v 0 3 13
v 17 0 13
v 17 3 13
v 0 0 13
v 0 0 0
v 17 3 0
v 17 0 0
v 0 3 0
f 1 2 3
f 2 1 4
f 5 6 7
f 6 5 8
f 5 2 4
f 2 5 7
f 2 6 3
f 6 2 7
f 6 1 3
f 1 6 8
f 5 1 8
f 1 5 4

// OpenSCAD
// Generated by SolidPython 1.0.1 on 2020-07-29 00:46:56


cube(size = [17, 3, 13]);
/***********************************************
*********      SolidPython code:      **********
************************************************
 
# import packages: SolidPython
from solid import *
from solid.utils import *
from itertools import chain, combinations, permutations


class Resize:

    def __init__(self, scad_file):
        self.scad_file = scad_file
        #self.scad_file = import_scad(scad_file)
        # cone/cylinder param:
        self.r1 = 0
        self.r2 = 0
        self.h = 0
        # rectangular prism param:
        self.w = 0
        self.l = 0
        # ellipse param:
        self.r = 0

    # import OpenScad code (file name corresponds to shape)


    # classify shape + parameters
    def assign(self, param1, param2, param3):
        if self.scad_file == 'cone.scad':
            self.r1 = param1
            self.r2 = param2
            self.h = param3
        elif self.scad_file == 'cylinder.scad':
            self.r1 = param1
            self.r2 = param2
            self.h = param3
        elif self.scad_file == 'rectangularPrism.scad':
            self.h = param1
            self.l = param2
            self.w = param3
        else:
            self.r = param1
            self.h = param2

    # resize parameters
    def iterate(self):
        x = range(3, 20, 2)
        i = 1
        if self.scad_file == 'cone.scad':
            tempList = list(permutations(x, 2))
            for temp in tempList:
                param1 = temp[0]
                param2 = temp[1]
                filepath = 'produced_scad_files/' + 'cone' + str(param1) + '_' + str(param2) + '_' + '.scad'
                scad_render_to_file(cylinder(h=param1, r1=param2, r2=0), filepath)

        elif self.scad_file == 'cylinder.scad':
            tempList = list(permutations(x, 3))
            for temp in tempList:
                param1 = temp[0]
                param2 = temp[1]
                filepath = 'produced_scad_files/' + 'cylinder' + str(param1) + '_' + str(param2) + '_' + '.scad'
                scad_render_to_file(cylinder(h=param1, r1=param2, r2=param2), filepath)

        elif self.scad_file == 'rectangularPrism.scad':
            tempList = list(permutations(x, 3))
            for temp in tempList:
                param1 = temp[0]
                param2 = temp[1]
                param3 = temp[2]
                filepath = 'produced_scad_files/' + 'rectangularPrism' + str(param1) + '_' + str(param2) + '_' + str(
                    param3) + '.scad'
                scad_render_to_file(cube(size=(param1, param2, param3)), filepath)

        elif self.scad_file == 'ellipse.scad':
            tempList = list(permutations(x, 4))
            for temp in tempList:
                param1 = temp[0]
                param2 = temp[1]
                param3 = temp[2]
                param4 = temp[3]
                filepath = 'produced_scad_files/' + 'ellipse' + str(param1) + '_' + str(param2) + '_' + str(param3) + '_' + str(param4) + '.scad'
                scad_render_to_file(scale([param1, param2, param3])(sphere(r=param4)), filepath)

    def render_to_scadfile(self):
        scad_render_to_file(scad, 'example.scad') 
 
************************************************/
